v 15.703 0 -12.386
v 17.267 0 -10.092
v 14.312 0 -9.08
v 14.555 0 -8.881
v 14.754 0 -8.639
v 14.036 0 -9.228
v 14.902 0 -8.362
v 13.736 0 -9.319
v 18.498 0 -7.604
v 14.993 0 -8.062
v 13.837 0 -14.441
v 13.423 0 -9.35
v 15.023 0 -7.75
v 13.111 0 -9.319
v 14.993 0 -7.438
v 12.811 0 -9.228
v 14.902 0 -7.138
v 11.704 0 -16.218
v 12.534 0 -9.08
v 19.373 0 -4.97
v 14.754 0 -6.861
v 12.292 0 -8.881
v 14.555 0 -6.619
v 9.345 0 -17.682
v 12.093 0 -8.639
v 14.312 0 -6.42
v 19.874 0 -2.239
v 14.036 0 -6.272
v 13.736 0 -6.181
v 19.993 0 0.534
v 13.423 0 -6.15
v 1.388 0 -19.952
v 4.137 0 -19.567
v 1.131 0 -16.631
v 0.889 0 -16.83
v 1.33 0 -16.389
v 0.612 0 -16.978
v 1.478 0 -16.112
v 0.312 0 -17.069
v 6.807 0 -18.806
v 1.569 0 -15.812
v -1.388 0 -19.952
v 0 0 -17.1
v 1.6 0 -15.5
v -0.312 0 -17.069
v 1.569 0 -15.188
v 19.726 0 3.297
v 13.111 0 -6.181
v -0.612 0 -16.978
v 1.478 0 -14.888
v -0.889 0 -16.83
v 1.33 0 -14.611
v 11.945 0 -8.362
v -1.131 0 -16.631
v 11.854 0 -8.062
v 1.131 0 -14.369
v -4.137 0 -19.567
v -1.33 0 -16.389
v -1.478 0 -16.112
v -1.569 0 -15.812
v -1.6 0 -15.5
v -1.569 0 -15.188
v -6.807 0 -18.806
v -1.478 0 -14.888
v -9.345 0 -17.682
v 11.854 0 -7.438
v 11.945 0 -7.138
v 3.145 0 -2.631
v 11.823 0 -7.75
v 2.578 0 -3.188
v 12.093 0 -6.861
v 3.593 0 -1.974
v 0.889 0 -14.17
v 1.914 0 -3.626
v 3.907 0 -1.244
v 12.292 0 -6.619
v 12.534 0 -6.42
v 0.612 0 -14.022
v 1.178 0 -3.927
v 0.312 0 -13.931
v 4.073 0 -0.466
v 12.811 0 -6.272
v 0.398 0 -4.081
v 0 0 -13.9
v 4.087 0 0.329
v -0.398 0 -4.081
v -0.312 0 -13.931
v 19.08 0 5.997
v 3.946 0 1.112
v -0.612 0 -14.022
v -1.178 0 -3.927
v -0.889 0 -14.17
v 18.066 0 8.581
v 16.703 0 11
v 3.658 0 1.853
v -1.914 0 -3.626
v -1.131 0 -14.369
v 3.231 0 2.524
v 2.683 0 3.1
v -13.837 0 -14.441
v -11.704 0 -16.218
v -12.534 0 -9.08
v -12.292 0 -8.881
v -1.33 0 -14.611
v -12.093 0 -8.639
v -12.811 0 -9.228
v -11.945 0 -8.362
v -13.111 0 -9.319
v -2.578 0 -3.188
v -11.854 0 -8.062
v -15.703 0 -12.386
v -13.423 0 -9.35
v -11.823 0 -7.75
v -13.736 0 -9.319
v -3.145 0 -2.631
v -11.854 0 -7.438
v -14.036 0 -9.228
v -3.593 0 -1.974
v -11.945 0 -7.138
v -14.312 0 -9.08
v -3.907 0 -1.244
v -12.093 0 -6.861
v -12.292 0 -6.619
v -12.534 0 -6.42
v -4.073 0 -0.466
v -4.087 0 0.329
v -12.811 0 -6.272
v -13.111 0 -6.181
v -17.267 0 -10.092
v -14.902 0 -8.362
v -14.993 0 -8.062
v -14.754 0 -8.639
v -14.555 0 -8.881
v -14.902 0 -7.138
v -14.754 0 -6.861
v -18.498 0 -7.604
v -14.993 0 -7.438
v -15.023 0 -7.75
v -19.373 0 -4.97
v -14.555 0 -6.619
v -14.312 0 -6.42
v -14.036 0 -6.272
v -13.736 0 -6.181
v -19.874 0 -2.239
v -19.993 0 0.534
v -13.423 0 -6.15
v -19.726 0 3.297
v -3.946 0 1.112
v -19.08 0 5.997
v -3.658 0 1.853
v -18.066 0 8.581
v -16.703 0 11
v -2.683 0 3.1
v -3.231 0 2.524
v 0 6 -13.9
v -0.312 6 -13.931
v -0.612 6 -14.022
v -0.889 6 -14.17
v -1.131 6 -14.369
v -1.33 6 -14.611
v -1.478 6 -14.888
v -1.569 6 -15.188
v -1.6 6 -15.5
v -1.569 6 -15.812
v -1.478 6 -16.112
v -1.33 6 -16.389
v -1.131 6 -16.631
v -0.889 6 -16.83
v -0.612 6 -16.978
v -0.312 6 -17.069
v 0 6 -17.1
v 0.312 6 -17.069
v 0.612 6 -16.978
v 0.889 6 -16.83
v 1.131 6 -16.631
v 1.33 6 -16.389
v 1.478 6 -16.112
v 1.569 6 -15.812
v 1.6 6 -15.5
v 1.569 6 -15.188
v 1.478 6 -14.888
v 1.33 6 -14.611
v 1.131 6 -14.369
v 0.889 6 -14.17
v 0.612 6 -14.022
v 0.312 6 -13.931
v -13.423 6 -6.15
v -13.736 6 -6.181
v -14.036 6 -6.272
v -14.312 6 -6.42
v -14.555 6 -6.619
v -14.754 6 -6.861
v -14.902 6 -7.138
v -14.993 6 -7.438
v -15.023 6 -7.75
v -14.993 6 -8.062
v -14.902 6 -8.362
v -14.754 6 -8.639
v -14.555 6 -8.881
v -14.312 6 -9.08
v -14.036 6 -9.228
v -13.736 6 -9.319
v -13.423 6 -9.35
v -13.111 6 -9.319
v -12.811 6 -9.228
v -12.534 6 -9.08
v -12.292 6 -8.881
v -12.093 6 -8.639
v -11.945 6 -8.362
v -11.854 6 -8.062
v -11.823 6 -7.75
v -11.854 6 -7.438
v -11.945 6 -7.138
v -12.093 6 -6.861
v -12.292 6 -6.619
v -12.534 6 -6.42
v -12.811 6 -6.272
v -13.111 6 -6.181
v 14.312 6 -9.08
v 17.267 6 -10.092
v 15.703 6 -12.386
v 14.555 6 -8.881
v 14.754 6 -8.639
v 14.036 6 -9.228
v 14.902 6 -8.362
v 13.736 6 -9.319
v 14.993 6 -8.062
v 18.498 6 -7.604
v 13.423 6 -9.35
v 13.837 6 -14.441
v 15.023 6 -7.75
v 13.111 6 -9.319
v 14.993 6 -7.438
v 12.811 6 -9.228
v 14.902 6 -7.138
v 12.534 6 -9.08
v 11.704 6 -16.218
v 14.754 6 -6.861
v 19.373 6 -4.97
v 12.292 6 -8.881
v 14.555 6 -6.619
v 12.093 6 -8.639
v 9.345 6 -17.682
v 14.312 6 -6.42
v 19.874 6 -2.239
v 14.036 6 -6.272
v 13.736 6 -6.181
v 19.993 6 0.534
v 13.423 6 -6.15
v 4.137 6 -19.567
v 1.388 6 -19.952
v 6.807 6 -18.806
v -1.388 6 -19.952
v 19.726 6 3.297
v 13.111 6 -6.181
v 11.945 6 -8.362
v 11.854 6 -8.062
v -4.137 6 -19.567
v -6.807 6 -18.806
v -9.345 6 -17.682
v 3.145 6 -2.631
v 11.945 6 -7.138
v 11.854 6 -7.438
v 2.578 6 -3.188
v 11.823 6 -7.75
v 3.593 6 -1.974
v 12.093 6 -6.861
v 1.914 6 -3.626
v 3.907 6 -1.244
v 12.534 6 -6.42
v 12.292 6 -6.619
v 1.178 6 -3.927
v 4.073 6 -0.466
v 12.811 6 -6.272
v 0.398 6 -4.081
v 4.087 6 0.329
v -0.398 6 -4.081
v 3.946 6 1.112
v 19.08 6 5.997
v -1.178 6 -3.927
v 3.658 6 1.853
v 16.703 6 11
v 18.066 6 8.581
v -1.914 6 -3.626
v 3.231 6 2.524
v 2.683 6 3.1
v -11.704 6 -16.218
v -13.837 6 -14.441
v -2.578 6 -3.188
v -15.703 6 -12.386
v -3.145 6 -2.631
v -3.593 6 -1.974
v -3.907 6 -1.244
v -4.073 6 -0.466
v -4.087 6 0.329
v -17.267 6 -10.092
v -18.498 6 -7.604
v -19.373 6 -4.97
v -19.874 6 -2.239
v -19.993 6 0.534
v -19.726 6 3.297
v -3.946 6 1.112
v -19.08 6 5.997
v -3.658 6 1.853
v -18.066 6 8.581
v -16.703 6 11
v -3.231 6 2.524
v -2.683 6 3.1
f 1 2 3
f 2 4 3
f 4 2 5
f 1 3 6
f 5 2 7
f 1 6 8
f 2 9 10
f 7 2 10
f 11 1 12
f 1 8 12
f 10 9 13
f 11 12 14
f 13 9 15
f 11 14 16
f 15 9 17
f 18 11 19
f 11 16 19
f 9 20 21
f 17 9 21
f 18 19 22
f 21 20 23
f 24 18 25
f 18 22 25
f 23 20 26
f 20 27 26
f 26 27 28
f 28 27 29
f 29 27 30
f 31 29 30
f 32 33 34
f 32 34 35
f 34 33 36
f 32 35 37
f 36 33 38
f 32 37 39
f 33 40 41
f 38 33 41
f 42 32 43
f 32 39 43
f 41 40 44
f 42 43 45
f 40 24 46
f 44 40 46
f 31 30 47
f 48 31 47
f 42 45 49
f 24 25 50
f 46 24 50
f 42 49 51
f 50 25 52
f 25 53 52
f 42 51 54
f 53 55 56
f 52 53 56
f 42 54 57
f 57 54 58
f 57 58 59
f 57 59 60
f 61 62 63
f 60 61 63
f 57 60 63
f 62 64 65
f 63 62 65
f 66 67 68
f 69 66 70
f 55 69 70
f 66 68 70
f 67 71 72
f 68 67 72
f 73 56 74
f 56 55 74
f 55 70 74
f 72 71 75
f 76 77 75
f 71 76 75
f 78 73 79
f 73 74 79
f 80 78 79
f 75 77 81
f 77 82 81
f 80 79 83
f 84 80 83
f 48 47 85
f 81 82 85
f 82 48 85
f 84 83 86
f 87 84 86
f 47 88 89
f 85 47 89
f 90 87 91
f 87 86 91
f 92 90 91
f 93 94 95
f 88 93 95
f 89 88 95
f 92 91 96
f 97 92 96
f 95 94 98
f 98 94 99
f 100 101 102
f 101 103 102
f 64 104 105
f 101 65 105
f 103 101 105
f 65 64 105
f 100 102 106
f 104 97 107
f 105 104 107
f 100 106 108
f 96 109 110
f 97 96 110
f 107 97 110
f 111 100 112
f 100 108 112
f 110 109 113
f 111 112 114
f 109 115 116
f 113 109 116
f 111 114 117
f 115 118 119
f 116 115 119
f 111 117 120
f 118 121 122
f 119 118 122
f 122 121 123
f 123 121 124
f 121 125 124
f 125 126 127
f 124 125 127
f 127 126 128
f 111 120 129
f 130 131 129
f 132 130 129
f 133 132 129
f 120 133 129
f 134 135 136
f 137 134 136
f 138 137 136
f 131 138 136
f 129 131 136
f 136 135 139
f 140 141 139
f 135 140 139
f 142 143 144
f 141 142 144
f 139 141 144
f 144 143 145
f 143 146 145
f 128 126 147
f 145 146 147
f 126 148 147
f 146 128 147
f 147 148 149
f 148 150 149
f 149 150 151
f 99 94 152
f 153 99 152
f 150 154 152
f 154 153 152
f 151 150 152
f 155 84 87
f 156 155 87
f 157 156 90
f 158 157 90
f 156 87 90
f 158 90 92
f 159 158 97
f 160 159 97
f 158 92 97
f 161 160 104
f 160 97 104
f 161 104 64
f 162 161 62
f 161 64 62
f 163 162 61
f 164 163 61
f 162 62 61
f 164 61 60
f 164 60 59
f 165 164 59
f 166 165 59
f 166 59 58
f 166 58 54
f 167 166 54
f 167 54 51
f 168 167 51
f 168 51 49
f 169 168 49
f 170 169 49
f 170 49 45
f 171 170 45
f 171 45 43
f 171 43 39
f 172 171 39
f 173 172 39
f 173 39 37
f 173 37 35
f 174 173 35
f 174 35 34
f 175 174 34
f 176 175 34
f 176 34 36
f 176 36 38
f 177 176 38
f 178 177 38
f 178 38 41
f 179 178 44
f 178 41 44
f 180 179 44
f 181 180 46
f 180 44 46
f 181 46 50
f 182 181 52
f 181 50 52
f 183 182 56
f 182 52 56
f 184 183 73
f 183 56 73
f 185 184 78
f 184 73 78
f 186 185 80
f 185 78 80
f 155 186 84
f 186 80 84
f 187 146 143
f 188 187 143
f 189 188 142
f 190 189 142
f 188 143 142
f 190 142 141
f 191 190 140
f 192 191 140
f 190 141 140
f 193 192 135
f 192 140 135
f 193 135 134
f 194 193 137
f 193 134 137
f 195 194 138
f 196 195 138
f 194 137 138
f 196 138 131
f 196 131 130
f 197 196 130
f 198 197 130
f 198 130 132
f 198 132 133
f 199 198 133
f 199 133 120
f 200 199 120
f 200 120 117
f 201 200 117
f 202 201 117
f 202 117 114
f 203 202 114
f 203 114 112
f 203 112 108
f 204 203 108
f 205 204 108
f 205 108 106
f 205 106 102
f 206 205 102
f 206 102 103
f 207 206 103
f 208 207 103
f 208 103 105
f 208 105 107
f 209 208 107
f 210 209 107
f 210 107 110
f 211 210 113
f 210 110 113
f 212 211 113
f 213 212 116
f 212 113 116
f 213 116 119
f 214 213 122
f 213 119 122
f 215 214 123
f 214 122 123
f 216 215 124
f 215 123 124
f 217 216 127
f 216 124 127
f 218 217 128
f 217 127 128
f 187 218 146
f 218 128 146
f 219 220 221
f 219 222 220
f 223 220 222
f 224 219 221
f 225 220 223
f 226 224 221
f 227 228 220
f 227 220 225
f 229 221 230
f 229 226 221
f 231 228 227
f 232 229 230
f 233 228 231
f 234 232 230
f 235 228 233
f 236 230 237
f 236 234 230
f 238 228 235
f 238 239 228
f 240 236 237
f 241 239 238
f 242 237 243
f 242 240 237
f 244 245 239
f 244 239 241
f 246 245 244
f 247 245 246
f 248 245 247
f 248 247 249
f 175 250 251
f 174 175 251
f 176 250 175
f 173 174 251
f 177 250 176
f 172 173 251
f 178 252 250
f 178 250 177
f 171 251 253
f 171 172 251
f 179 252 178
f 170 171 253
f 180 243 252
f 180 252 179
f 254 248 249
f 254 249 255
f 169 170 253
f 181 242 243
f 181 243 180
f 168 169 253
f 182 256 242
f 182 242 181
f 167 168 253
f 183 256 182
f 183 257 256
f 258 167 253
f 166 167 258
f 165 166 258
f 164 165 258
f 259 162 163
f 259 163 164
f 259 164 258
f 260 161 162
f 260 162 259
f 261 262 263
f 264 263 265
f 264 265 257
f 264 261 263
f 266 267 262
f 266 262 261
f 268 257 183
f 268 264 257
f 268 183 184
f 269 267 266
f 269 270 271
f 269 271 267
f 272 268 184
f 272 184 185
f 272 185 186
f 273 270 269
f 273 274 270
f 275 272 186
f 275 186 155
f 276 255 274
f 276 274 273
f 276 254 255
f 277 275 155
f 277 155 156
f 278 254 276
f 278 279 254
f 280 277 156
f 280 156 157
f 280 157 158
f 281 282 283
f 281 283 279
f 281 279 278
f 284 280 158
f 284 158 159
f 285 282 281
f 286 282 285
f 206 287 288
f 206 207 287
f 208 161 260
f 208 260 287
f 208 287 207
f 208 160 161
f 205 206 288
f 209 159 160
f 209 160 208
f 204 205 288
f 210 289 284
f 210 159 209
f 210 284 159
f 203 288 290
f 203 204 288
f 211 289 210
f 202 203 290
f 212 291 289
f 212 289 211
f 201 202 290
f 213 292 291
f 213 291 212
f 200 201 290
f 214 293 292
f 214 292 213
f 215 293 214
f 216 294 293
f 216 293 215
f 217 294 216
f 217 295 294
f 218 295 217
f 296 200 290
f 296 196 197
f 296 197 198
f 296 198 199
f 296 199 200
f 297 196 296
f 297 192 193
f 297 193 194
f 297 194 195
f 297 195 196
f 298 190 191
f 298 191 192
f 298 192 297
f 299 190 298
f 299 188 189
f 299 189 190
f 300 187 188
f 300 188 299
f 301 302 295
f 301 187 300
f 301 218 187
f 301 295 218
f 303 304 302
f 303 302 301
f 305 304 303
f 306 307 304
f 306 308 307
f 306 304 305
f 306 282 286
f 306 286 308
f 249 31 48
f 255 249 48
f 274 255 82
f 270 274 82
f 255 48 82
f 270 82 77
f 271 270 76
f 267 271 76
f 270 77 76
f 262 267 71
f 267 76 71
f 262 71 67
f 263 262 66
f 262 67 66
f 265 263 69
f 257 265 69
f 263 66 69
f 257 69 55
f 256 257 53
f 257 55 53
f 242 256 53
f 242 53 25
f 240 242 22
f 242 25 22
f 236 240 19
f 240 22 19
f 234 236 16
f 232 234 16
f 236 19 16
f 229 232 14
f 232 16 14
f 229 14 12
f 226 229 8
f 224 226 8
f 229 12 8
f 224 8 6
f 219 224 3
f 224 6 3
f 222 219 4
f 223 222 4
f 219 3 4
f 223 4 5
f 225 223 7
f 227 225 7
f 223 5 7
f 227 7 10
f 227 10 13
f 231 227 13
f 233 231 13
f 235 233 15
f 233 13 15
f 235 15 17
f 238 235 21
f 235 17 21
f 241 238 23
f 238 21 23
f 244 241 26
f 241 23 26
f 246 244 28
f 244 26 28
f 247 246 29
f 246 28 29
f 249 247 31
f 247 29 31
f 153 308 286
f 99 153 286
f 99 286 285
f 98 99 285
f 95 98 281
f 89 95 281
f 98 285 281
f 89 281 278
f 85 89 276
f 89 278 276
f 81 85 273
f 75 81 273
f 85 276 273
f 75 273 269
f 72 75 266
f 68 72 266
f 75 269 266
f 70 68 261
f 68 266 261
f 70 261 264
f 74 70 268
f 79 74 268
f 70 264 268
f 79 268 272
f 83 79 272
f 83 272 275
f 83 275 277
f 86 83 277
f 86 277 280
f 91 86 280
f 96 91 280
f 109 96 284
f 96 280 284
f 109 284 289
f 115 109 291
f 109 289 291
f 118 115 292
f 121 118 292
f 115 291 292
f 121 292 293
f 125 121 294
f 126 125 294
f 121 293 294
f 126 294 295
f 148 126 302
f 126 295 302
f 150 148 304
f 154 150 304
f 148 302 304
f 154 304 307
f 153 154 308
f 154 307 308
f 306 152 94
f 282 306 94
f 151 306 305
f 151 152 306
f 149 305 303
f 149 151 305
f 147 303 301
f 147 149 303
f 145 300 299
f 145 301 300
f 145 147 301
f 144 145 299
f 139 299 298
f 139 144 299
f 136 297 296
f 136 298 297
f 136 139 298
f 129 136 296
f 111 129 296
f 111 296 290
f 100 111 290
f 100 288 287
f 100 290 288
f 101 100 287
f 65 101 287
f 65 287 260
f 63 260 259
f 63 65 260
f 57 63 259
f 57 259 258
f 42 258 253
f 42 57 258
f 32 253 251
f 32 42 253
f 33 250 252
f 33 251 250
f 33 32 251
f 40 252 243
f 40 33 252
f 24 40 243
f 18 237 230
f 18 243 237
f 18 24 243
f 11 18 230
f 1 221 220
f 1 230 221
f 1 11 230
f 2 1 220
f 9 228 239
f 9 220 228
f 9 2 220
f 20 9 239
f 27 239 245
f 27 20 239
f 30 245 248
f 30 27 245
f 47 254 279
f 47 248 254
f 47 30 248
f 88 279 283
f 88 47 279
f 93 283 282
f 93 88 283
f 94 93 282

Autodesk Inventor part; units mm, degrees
ref_plane "YZ Plane" through (0, 0, 0) normal (1, 0, 0) x (0, 1, 0)
ref_plane "XZ Plane" through (0, 0, 0) normal (0, 1, 0) x (-1, 0, 0)
ref_plane "XY Plane" through (0, 0, 0) normal (0, 0, 1) x (1, 0, 0)
sketch "スケッチ1" plane through (0, 0, 0) normal (0, 1, 0) x (-1, 0, 0)
  arc A0 (-16.7033, 11) -> (16.7033, 11) centre (0, 0) ccw
  line L0 (16.7033, 11) -> (-16.7033, 11)
  point P0 (0, 11)
  dimension "d0" = 40
  dimension "d1" = 11
extrude "押し出し1" add sketch "スケッチ1" along normal blind 6
sketch "スケッチ3" plane through (0, 6, 0) normal (0, 1, 0) x (1, 0, 0)
  arc A0 (2.6833, -3.1) -> (-2.6833, -3.1) centre (0, 0) ccw
  line L0 (-2.6833, -3.1) -> (2.6833, -3.1)
  point P0 (0, -3.1)
  dimension "d12" = 8.2
  dimension "d13" = 3.1
extrude "押し出し2" cut sketch "スケッチ3" against normal blind 6
sketch "スケッチ4" plane through (0, 6, 0) normal (0, 1, 0) x (1, 0, 0)
  circle A0 centre (0, 0) radius 15.5 construction
  line L0 (0, 0) -> (-19.4826, 11.2483) construction
  line L1 (0, 0) -> (29.419, 16.9851) construction
  line L2 (0, 0) -> (0, 25.14) construction
  point P0 (0, 15.5)
  point P1 (-13.4234, 7.75)
  point P2 (-13.4234, 7.75)
  point P3 (0, 15.5)
  point P4 (13.4234, 7.75)
  dimension "d16" = 31
  dimension "d17" = 60
  dimension "d18" = 60
hole "穴2" at (0, 6, -15.5) at (-13.4234, 6, -7.75) at (13.4234, 6, -7.75) direction (0, -1, 0) diameter 3.2 end through all
properties part number "射出_留め具2"
